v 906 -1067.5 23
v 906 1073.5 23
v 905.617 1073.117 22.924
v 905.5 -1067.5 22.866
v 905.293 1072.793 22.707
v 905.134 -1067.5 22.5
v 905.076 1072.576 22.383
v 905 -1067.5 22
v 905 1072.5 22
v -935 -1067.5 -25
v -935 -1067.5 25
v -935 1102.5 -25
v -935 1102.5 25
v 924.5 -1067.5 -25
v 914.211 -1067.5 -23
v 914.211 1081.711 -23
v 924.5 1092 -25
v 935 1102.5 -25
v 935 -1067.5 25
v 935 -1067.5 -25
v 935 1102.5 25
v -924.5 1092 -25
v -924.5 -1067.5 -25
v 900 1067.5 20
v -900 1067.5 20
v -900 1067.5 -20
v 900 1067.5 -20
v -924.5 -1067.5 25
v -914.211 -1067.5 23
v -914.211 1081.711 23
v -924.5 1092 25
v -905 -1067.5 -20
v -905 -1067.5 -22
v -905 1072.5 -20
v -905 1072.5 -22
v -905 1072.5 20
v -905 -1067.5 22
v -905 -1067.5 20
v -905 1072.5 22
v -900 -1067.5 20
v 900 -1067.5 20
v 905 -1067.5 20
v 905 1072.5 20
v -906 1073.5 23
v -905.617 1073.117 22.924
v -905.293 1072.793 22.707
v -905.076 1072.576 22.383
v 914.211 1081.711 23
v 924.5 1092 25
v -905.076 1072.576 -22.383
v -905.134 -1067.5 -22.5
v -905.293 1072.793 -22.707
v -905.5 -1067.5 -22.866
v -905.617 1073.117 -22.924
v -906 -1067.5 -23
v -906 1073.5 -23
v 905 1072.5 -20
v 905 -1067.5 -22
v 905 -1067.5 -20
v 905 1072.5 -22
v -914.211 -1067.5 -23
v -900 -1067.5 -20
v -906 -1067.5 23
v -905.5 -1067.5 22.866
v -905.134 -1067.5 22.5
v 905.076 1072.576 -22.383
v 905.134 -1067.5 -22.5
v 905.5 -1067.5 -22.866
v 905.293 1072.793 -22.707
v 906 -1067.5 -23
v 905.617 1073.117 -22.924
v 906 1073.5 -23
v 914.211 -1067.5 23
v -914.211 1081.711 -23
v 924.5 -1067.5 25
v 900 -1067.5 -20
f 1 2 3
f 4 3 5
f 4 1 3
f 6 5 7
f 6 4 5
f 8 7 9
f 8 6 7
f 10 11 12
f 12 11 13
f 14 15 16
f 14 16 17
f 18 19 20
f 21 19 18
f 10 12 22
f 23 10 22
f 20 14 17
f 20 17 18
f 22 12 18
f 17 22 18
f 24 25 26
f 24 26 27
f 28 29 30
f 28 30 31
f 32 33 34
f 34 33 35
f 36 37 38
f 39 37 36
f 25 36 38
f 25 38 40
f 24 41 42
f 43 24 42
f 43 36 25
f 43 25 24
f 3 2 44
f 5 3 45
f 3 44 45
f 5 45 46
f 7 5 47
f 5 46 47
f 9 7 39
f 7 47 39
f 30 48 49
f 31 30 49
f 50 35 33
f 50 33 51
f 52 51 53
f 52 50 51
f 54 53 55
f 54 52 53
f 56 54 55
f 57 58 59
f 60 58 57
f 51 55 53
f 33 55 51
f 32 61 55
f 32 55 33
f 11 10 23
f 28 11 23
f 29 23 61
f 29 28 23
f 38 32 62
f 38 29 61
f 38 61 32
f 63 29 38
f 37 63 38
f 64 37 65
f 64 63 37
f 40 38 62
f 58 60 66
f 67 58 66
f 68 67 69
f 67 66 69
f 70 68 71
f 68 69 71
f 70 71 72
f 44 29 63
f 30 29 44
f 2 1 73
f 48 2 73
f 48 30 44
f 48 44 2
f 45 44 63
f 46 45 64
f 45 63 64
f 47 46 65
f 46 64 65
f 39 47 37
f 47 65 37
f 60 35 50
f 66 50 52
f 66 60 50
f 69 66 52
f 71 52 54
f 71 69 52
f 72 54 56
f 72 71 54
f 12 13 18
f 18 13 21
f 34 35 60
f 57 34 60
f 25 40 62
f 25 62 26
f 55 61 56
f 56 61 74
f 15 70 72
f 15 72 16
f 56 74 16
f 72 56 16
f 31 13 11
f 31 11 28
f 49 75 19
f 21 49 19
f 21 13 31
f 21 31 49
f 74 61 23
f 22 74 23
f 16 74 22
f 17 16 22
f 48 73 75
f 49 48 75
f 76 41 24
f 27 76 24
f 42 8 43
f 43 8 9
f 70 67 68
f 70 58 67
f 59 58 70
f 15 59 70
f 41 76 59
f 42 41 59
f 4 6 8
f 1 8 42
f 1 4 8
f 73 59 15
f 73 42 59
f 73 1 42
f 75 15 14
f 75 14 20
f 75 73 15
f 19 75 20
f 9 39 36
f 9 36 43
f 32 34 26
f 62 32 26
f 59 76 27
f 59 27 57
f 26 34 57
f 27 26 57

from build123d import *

# Parameters (mm, degrees)
SKETCH1_W           = 1870
SKETCH1_H           = 2205
SKETCH1_W_2         = 1800
SKETCH1_H_2         = 2135
BOSS_EXTRUDE1_DEPTH = 25
SKETCH2_W           = 1810
SKETCH2_H           = 2145
CUT_EXTRUDE2_DEPTH  = 5
SKETCH3_W           = 1825
SKETCH3_H           = 2160
CUT_EXTRUDE4_DEPTH  = 2
FILLET1_R           = 1
CHAMFER1_SIZE       = 2.33256371
CHAMFER1_SIZE_2     = 12
FILLET2_R           = 1
CHAMFER2_SIZE       = 2.33256371
CHAMFER2_SIZE_2     = 12
SKETCH5_W           = 1870
SKETCH5_H           = 50
CUT_EXTRUDE5_DEPTH  = 35


with BuildPart() as part:
    # Sketch1 → Boss-Extrude1 (new, symmetric)
    with BuildSketch(Plane.XY):
        Rectangle(SKETCH1_W, SKETCH1_H)
        Rectangle(SKETCH1_W_2, SKETCH1_H_2, mode=Mode.SUBTRACT)
    extrude(amount=BOSS_EXTRUDE1_DEPTH, both=True)

    # Sketch2 → Cut-Extrude2 (cut)
    with BuildSketch(Plane.XY.offset(25)):
        Rectangle(SKETCH2_W, SKETCH2_H)
    cut_extrude2 = extrude(amount=-CUT_EXTRUDE2_DEPTH, mode=Mode.SUBTRACT)

    # Sketch3 → Cut-Extrude4 (cut)
    with BuildSketch(Plane.XY.offset(25)):
        Rectangle(SKETCH3_W, SKETCH3_H)
    cut_extrude4 = extrude(amount=-CUT_EXTRUDE4_DEPTH, mode=Mode.SUBTRACT)

    # Fillet1
    fillet1_edges = [part.edges().sort_by_distance(p)[0] for p in [
        (0, -1072.5, 23),
        (-905, 0, 23),
        (0, 1072.5, 23),
        (905, 0, 23),
    ]]
    fillet(fillet1_edges, radius=FILLET1_R)

    # Chamfer1
    # the kernel refuses this chamfer: 12, 2.33256371 mm, written as the material it takes off along each edge
    with BuildSketch(Plane(origin=(912.5, 1080, 25), x_dir=(0, -0.1907987049962236, -0.9816291836389973), z_dir=(-1, 0, 0))) as chamfer1_piece_1_section:
        Polygon((CHAMFER1_SIZE * 0.981629183493, -CHAMFER1_SIZE * 0.190798704968), (-CHAMFER1_SIZE_2 * 0.190798704996, -CHAMFER1_SIZE_2 * 0.981629183639), (0, 0), align=None)
    chamfer1_piece_1 = extrude(amount=1825, mode=Mode.PRIVATE)
    chamfer1_piece_1 = split(chamfer1_piece_1, bisect_by=Plane(origin=(0, 1084.39239505, 23), z_dir=(0, 0, 1)), keep=Keep.TOP, mode=Mode.PRIVATE)
    add(chamfer1_piece_1, mode=Mode.SUBTRACT)
    with BuildSketch(Plane(origin=(912.5, -1080, 25), x_dir=(-0.1907987049962236, 0, -0.9816291836389973), z_dir=(0, 1, 0))) as chamfer1_piece_2_section:
        Polygon((CHAMFER1_SIZE * 0.981629183493, -CHAMFER1_SIZE * 0.190798704968), (-CHAMFER1_SIZE_2 * 0.190798704996, -CHAMFER1_SIZE_2 * 0.981629183639), (0, 0), align=None)
    chamfer1_piece_2 = extrude(amount=2160, mode=Mode.PRIVATE)
    chamfer1_piece_2 = split(chamfer1_piece_2, bisect_by=Plane(origin=(916.89239505, 0, 23), z_dir=(0, 0, 1)), keep=Keep.TOP, mode=Mode.PRIVATE)
    add(chamfer1_piece_2, mode=Mode.SUBTRACT)
    with BuildSketch(Plane(origin=(-912.5, -1080, 25), x_dir=(0, 0.1907987049962236, -0.9816291836389973), z_dir=(1, 0, 0))) as chamfer1_piece_3_section:
        Polygon((CHAMFER1_SIZE * 0.981629183493, -CHAMFER1_SIZE * 0.190798704968), (-CHAMFER1_SIZE_2 * 0.190798704996, -CHAMFER1_SIZE_2 * 0.981629183639), (0, 0), align=None)
    chamfer1_piece_3 = extrude(amount=1825, mode=Mode.PRIVATE)
    chamfer1_piece_3 = split(chamfer1_piece_3, bisect_by=Plane(origin=(0, -1084.39239505, 23), z_dir=(0, 0, 1)), keep=Keep.TOP, mode=Mode.PRIVATE)
    add(chamfer1_piece_3, mode=Mode.SUBTRACT)
    with BuildSketch(Plane(origin=(-912.5, 1080, 25), x_dir=(0.1907987049962236, 0, -0.9816291836389973), z_dir=(0, -1, 0))) as chamfer1_piece_4_section:
        Polygon((CHAMFER1_SIZE * 0.981629183493, -CHAMFER1_SIZE * 0.190798704968), (-CHAMFER1_SIZE_2 * 0.190798704996, -CHAMFER1_SIZE_2 * 0.981629183639), (0, 0), align=None)
    chamfer1_piece_4 = extrude(amount=2160, mode=Mode.PRIVATE)
    chamfer1_piece_4 = split(chamfer1_piece_4, bisect_by=Plane(origin=(-916.89239505, 0, 23), z_dir=(0, 0, 1)), keep=Keep.TOP, mode=Mode.PRIVATE)
    add(chamfer1_piece_4, mode=Mode.SUBTRACT)
    with BuildSketch(Plane(origin=(912.5, -1080, 25), x_dir=(-0.1907987049962236, 0, -0.9816291836389973), z_dir=(0, 1, 0))) as chamfer1_piece_5a_section:
        Polygon((CHAMFER1_SIZE * 0.981629183493, -CHAMFER1_SIZE * 0.190798704968), (-CHAMFER1_SIZE_2 * 0.190798704996, -CHAMFER1_SIZE_2 * 0.981629183639), (0, 0), align=None)
    chamfer1_piece_5a = extrude(amount=2191.178793389, mode=Mode.PRIVATE)
    chamfer1_piece_5a = split(chamfer1_piece_5a, bisect_by=Plane(origin=(916.89239505, 1095.589396695, 23), z_dir=(0, 0, 1)), keep=Keep.TOP, mode=Mode.PRIVATE)
    chamfer1_piece_5a = split(chamfer1_piece_5a, bisect_by=Plane(origin=(916.89239505, 1080, 24.399204817), z_dir=(0, 1, 0)), keep=Keep.TOP, mode=Mode.PRIVATE)
    with BuildSketch(Plane(origin=(943.678793389, 1080, 25), x_dir=(0, -0.1907987049962236, -0.9816291836389973), z_dir=(-1, 0, 0))) as chamfer1_piece_5b_section:
        Polygon((CHAMFER1_SIZE * 0.981629183493, -CHAMFER1_SIZE * 0.190798704968), (-CHAMFER1_SIZE_2 * 0.190798704996, -CHAMFER1_SIZE_2 * 0.981629183639), (0, 0), align=None)
    chamfer1_piece_5b = extrude(amount=1856.178793389, mode=Mode.PRIVATE)
    chamfer1_piece_5b = split(chamfer1_piece_5b, bisect_by=Plane(origin=(928.089396695, 1084.39239505, 23), z_dir=(0, 0, 1)), keep=Keep.TOP, mode=Mode.PRIVATE)
    chamfer1_piece_5b = split(chamfer1_piece_5b, bisect_by=Plane(origin=(912.5, 1084.39239505, 24.399204817), z_dir=(1, 0, 0)), keep=Keep.TOP, mode=Mode.PRIVATE)
    chamfer1_piece_5 = chamfer1_piece_5a & chamfer1_piece_5b
    add(chamfer1_piece_5, mode=Mode.SUBTRACT)
    with BuildSketch(Plane(origin=(912.5, 1080, 25), x_dir=(0, -0.1907987049962236, -0.9816291836389973), z_dir=(-1, 0, 0))) as chamfer1_piece_6a_section:
        Polygon((CHAMFER1_SIZE * 0.981629183493, -CHAMFER1_SIZE * 0.190798704968), (-CHAMFER1_SIZE_2 * 0.190798704996, -CHAMFER1_SIZE_2 * 0.981629183639), (0, 0), align=None)
    chamfer1_piece_6a = extrude(amount=1856.178793389, mode=Mode.PRIVATE)
    chamfer1_piece_6a = split(chamfer1_piece_6a, bisect_by=Plane(origin=(-928.089396695, 1084.39239505, 23), z_dir=(0, 0, 1)), keep=Keep.TOP, mode=Mode.PRIVATE)
    chamfer1_piece_6a = split(chamfer1_piece_6a, bisect_by=Plane(origin=(-912.5, 1084.39239505, 24.399204817), z_dir=(-1, 0, 0)), keep=Keep.TOP, mode=Mode.PRIVATE)
    with BuildSketch(Plane(origin=(-912.5, 1111.178793389, 25), x_dir=(0.1907987049962236, 0, -0.9816291836389973), z_dir=(0, -1, 0))) as chamfer1_piece_6b_section:
        Polygon((CHAMFER1_SIZE * 0.981629183493, -CHAMFER1_SIZE * 0.190798704968), (-CHAMFER1_SIZE_2 * 0.190798704996, -CHAMFER1_SIZE_2 * 0.981629183639), (0, 0), align=None)
    chamfer1_piece_6b = extrude(amount=2191.178793389, mode=Mode.PRIVATE)
    chamfer1_piece_6b = split(chamfer1_piece_6b, bisect_by=Plane(origin=(-916.89239505, 1095.589396695, 23), z_dir=(0, 0, 1)), keep=Keep.TOP, mode=Mode.PRIVATE)
    chamfer1_piece_6b = split(chamfer1_piece_6b, bisect_by=Plane(origin=(-916.89239505, 1080, 24.399204817), z_dir=(0, 1, 0)), keep=Keep.TOP, mode=Mode.PRIVATE)
    chamfer1_piece_6 = chamfer1_piece_6a & chamfer1_piece_6b
    add(chamfer1_piece_6, mode=Mode.SUBTRACT)
    with BuildSketch(Plane(origin=(912.5, -1111.178793389, 25), x_dir=(-0.1907987049962236, 0, -0.9816291836389973), z_dir=(0, 1, 0))) as chamfer1_piece_7a_section:
        Polygon((CHAMFER1_SIZE * 0.981629183493, -CHAMFER1_SIZE * 0.190798704968), (-CHAMFER1_SIZE_2 * 0.190798704996, -CHAMFER1_SIZE_2 * 0.981629183639), (0, 0), align=None)
    chamfer1_piece_7a = extrude(amount=2191.178793389, mode=Mode.PRIVATE)
    chamfer1_piece_7a = split(chamfer1_piece_7a, bisect_by=Plane(origin=(916.89239505, -1095.589396695, 23), z_dir=(0, 0, 1)), keep=Keep.TOP, mode=Mode.PRIVATE)
    chamfer1_piece_7a = split(chamfer1_piece_7a, bisect_by=Plane(origin=(916.89239505, -1080, 24.399204817), z_dir=(0, -1, 0)), keep=Keep.TOP, mode=Mode.PRIVATE)
    with BuildSketch(Plane(origin=(-912.5, -1080, 25), x_dir=(0, 0.1907987049962236, -0.9816291836389973), z_dir=(1, 0, 0))) as chamfer1_piece_7b_section:
        Polygon((CHAMFER1_SIZE * 0.981629183493, -CHAMFER1_SIZE * 0.190798704968), (-CHAMFER1_SIZE_2 * 0.190798704996, -CHAMFER1_SIZE_2 * 0.981629183639), (0, 0), align=None)
    chamfer1_piece_7b = extrude(amount=1856.178793389, mode=Mode.PRIVATE)
    chamfer1_piece_7b = split(chamfer1_piece_7b, bisect_by=Plane(origin=(928.089396695, -1084.39239505, 23), z_dir=(0, 0, 1)), keep=Keep.TOP, mode=Mode.PRIVATE)
    chamfer1_piece_7b = split(chamfer1_piece_7b, bisect_by=Plane(origin=(912.5, -1084.39239505, 24.399204817), z_dir=(1, 0, 0)), keep=Keep.TOP, mode=Mode.PRIVATE)
    chamfer1_piece_7 = chamfer1_piece_7a & chamfer1_piece_7b
    add(chamfer1_piece_7, mode=Mode.SUBTRACT)
    with BuildSketch(Plane(origin=(-943.678793389, -1080, 25), x_dir=(0, 0.1907987049962236, -0.9816291836389973), z_dir=(1, 0, 0))) as chamfer1_piece_8a_section:
        Polygon((CHAMFER1_SIZE * 0.981629183493, -CHAMFER1_SIZE * 0.190798704968), (-CHAMFER1_SIZE_2 * 0.190798704996, -CHAMFER1_SIZE_2 * 0.981629183639), (0, 0), align=None)
    chamfer1_piece_8a = extrude(amount=1856.178793389, mode=Mode.PRIVATE)
    chamfer1_piece_8a = split(chamfer1_piece_8a, bisect_by=Plane(origin=(-928.089396695, -1084.39239505, 23), z_dir=(0, 0, 1)), keep=Keep.TOP, mode=Mode.PRIVATE)
    chamfer1_piece_8a = split(chamfer1_piece_8a, bisect_by=Plane(origin=(-912.5, -1084.39239505, 24.399204817), z_dir=(-1, 0, 0)), keep=Keep.TOP, mode=Mode.PRIVATE)
    with BuildSketch(Plane(origin=(-912.5, 1080, 25), x_dir=(0.1907987049962236, 0, -0.9816291836389973), z_dir=(0, -1, 0))) as chamfer1_piece_8b_section:
        Polygon((CHAMFER1_SIZE * 0.981629183493, -CHAMFER1_SIZE * 0.190798704968), (-CHAMFER1_SIZE_2 * 0.190798704996, -CHAMFER1_SIZE_2 * 0.981629183639), (0, 0), align=None)
    chamfer1_piece_8b = extrude(amount=2191.178793389, mode=Mode.PRIVATE)
    chamfer1_piece_8b = split(chamfer1_piece_8b, bisect_by=Plane(origin=(-916.89239505, -1095.589396695, 23), z_dir=(0, 0, 1)), keep=Keep.TOP, mode=Mode.PRIVATE)
    chamfer1_piece_8b = split(chamfer1_piece_8b, bisect_by=Plane(origin=(-916.89239505, -1080, 24.399204817), z_dir=(0, -1, 0)), keep=Keep.TOP, mode=Mode.PRIVATE)
    chamfer1_piece_8 = chamfer1_piece_8a & chamfer1_piece_8b
    add(chamfer1_piece_8, mode=Mode.SUBTRACT)

    # Mirror1: Cut-Extrude2, Cut-Extrude4 across plane
    add(cut_extrude2.mirror(Plane.XY), mode=Mode.SUBTRACT)
    add(cut_extrude4.mirror(Plane.XY), mode=Mode.SUBTRACT)

    # Fillet2
    fillet2_edges = [part.edges().sort_by_distance(p)[0] for p in [
        (0, 1072.5, -23),
        (0, -1072.5, -23),
        (-905, 0, -23),
        (905, 0, -23),
    ]]
    fillet(fillet2_edges, radius=FILLET2_R)

    # Chamfer2
    # the kernel refuses this chamfer: 12, 2.33256371 mm, written as the material it takes off along each edge
    with BuildSketch(Plane(origin=(912.5, 1080, -25), x_dir=(0, -0.1907987049962236, 0.9816291836389973), z_dir=(-1, 0, 0))) as chamfer2_piece_1_section:
        Polygon((CHAMFER2_SIZE * 0.981629183493, CHAMFER2_SIZE * 0.190798704968), (-CHAMFER2_SIZE_2 * 0.190798704996, CHAMFER2_SIZE_2 * 0.981629183639), (0, 0), align=None)
    chamfer2_piece_1 = extrude(amount=1825, mode=Mode.PRIVATE)
    chamfer2_piece_1 = split(chamfer2_piece_1, bisect_by=Plane(origin=(0, 1084.39239505, -23), z_dir=(0, 0, -1)), keep=Keep.TOP, mode=Mode.PRIVATE)
    add(chamfer2_piece_1, mode=Mode.SUBTRACT)
    with BuildSketch(Plane(origin=(912.5, -1080, -25), x_dir=(-0.1907987049962236, 0, 0.9816291836389973), z_dir=(0, 1, 0))) as chamfer2_piece_2_section:
        Polygon((CHAMFER2_SIZE * 0.981629183493, CHAMFER2_SIZE * 0.190798704968), (-CHAMFER2_SIZE_2 * 0.190798704996, CHAMFER2_SIZE_2 * 0.981629183639), (0, 0), align=None)
    chamfer2_piece_2 = extrude(amount=2160, mode=Mode.PRIVATE)
    chamfer2_piece_2 = split(chamfer2_piece_2, bisect_by=Plane(origin=(916.89239505, 0, -23), z_dir=(0, 0, -1)), keep=Keep.TOP, mode=Mode.PRIVATE)
    add(chamfer2_piece_2, mode=Mode.SUBTRACT)
    with BuildSketch(Plane(origin=(-912.5, 1080, -25), x_dir=(0.1907987049962236, 0, 0.9816291836389973), z_dir=(0, -1, 0))) as chamfer2_piece_3_section:
        Polygon((CHAMFER2_SIZE * 0.981629183493, CHAMFER2_SIZE * 0.190798704968), (-CHAMFER2_SIZE_2 * 0.190798704996, CHAMFER2_SIZE_2 * 0.981629183639), (0, 0), align=None)
    chamfer2_piece_3 = extrude(amount=2160, mode=Mode.PRIVATE)
    chamfer2_piece_3 = split(chamfer2_piece_3, bisect_by=Plane(origin=(-916.89239505, 0, -23), z_dir=(0, 0, -1)), keep=Keep.TOP, mode=Mode.PRIVATE)
    add(chamfer2_piece_3, mode=Mode.SUBTRACT)
    with BuildSketch(Plane(origin=(-912.5, -1080, -25), x_dir=(0, 0.1907987049962236, 0.9816291836389973), z_dir=(1, 0, 0))) as chamfer2_piece_4_section:
        Polygon((CHAMFER2_SIZE * 0.981629183493, CHAMFER2_SIZE * 0.190798704968), (-CHAMFER2_SIZE_2 * 0.190798704996, CHAMFER2_SIZE_2 * 0.981629183639), (0, 0), align=None)
    chamfer2_piece_4 = extrude(amount=1825, mode=Mode.PRIVATE)
    chamfer2_piece_4 = split(chamfer2_piece_4, bisect_by=Plane(origin=(0, -1084.39239505, -23), z_dir=(0, 0, -1)), keep=Keep.TOP, mode=Mode.PRIVATE)
    add(chamfer2_piece_4, mode=Mode.SUBTRACT)
    with BuildSketch(Plane(origin=(912.5, -1080, -25), x_dir=(-0.1907987049962236, 0, 0.9816291836389973), z_dir=(0, 1, 0))) as chamfer2_piece_5a_section:
        Polygon((CHAMFER2_SIZE * 0.981629183493, CHAMFER2_SIZE * 0.190798704968), (-CHAMFER2_SIZE_2 * 0.190798704996, CHAMFER2_SIZE_2 * 0.981629183639), (0, 0), align=None)
    chamfer2_piece_5a = extrude(amount=2191.178793389, mode=Mode.PRIVATE)
    chamfer2_piece_5a = split(chamfer2_piece_5a, bisect_by=Plane(origin=(916.89239505, 1095.589396695, -23), z_dir=(0, 0, -1)), keep=Keep.TOP, mode=Mode.PRIVATE)
    chamfer2_piece_5a = split(chamfer2_piece_5a, bisect_by=Plane(origin=(916.89239505, 1080, -24.399204817), z_dir=(0, 1, 0)), keep=Keep.TOP, mode=Mode.PRIVATE)
    with BuildSketch(Plane(origin=(943.678793389, 1080, -25), x_dir=(0, -0.1907987049962236, 0.9816291836389973), z_dir=(-1, 0, 0))) as chamfer2_piece_5b_section:
        Polygon((CHAMFER2_SIZE * 0.981629183493, CHAMFER2_SIZE * 0.190798704968), (-CHAMFER2_SIZE_2 * 0.190798704996, CHAMFER2_SIZE_2 * 0.981629183639), (0, 0), align=None)
    chamfer2_piece_5b = extrude(amount=1856.178793389, mode=Mode.PRIVATE)
    chamfer2_piece_5b = split(chamfer2_piece_5b, bisect_by=Plane(origin=(928.089396695, 1084.39239505, -23), z_dir=(0, 0, -1)), keep=Keep.TOP, mode=Mode.PRIVATE)
    chamfer2_piece_5b = split(chamfer2_piece_5b, bisect_by=Plane(origin=(912.5, 1084.39239505, -24.399204817), z_dir=(1, 0, 0)), keep=Keep.TOP, mode=Mode.PRIVATE)
    chamfer2_piece_5 = chamfer2_piece_5a & chamfer2_piece_5b
    add(chamfer2_piece_5, mode=Mode.SUBTRACT)
    with BuildSketch(Plane(origin=(912.5, 1080, -25), x_dir=(0, -0.1907987049962236, 0.9816291836389973), z_dir=(-1, 0, 0))) as chamfer2_piece_6a_section:
        Polygon((CHAMFER2_SIZE * 0.981629183493, CHAMFER2_SIZE * 0.190798704968), (-CHAMFER2_SIZE_2 * 0.190798704996, CHAMFER2_SIZE_2 * 0.981629183639), (0, 0), align=None)
    chamfer2_piece_6a = extrude(amount=1856.178793389, mode=Mode.PRIVATE)
    chamfer2_piece_6a = split(chamfer2_piece_6a, bisect_by=Plane(origin=(-928.089396695, 1084.39239505, -23), z_dir=(0, 0, -1)), keep=Keep.TOP, mode=Mode.PRIVATE)
    chamfer2_piece_6a = split(chamfer2_piece_6a, bisect_by=Plane(origin=(-912.5, 1084.39239505, -24.399204817), z_dir=(-1, 0, 0)), keep=Keep.TOP, mode=Mode.PRIVATE)
    with BuildSketch(Plane(origin=(-912.5, 1111.178793389, -25), x_dir=(0.1907987049962236, 0, 0.9816291836389973), z_dir=(0, -1, 0))) as chamfer2_piece_6b_section:
        Polygon((CHAMFER2_SIZE * 0.981629183493, CHAMFER2_SIZE * 0.190798704968), (-CHAMFER2_SIZE_2 * 0.190798704996, CHAMFER2_SIZE_2 * 0.981629183639), (0, 0), align=None)
    chamfer2_piece_6b = extrude(amount=2191.178793389, mode=Mode.PRIVATE)
    chamfer2_piece_6b = split(chamfer2_piece_6b, bisect_by=Plane(origin=(-916.89239505, 1095.589396695, -23), z_dir=(0, 0, -1)), keep=Keep.TOP, mode=Mode.PRIVATE)
    chamfer2_piece_6b = split(chamfer2_piece_6b, bisect_by=Plane(origin=(-916.89239505, 1080, -24.399204817), z_dir=(0, 1, 0)), keep=Keep.TOP, mode=Mode.PRIVATE)
    chamfer2_piece_6 = chamfer2_piece_6a & chamfer2_piece_6b
    add(chamfer2_piece_6, mode=Mode.SUBTRACT)
    with BuildSketch(Plane(origin=(912.5, -1111.178793389, -25), x_dir=(-0.1907987049962236, 0, 0.9816291836389973), z_dir=(0, 1, 0))) as chamfer2_piece_7a_section:
        Polygon((CHAMFER2_SIZE * 0.981629183493, CHAMFER2_SIZE * 0.190798704968), (-CHAMFER2_SIZE_2 * 0.190798704996, CHAMFER2_SIZE_2 * 0.981629183639), (0, 0), align=None)
    chamfer2_piece_7a = extrude(amount=2191.178793389, mode=Mode.PRIVATE)
    chamfer2_piece_7a = split(chamfer2_piece_7a, bisect_by=Plane(origin=(916.89239505, -1095.589396695, -23), z_dir=(0, 0, -1)), keep=Keep.TOP, mode=Mode.PRIVATE)
    chamfer2_piece_7a = split(chamfer2_piece_7a, bisect_by=Plane(origin=(916.89239505, -1080, -24.399204817), z_dir=(0, -1, 0)), keep=Keep.TOP, mode=Mode.PRIVATE)
    with BuildSketch(Plane(origin=(-912.5, -1080, -25), x_dir=(0, 0.1907987049962236, 0.9816291836389973), z_dir=(1, 0, 0))) as chamfer2_piece_7b_section:
        Polygon((CHAMFER2_SIZE * 0.981629183493, CHAMFER2_SIZE * 0.190798704968), (-CHAMFER2_SIZE_2 * 0.190798704996, CHAMFER2_SIZE_2 * 0.981629183639), (0, 0), align=None)
    chamfer2_piece_7b = extrude(amount=1856.178793389, mode=Mode.PRIVATE)
    chamfer2_piece_7b = split(chamfer2_piece_7b, bisect_by=Plane(origin=(928.089396695, -1084.39239505, -23), z_dir=(0, 0, -1)), keep=Keep.TOP, mode=Mode.PRIVATE)
    chamfer2_piece_7b = split(chamfer2_piece_7b, bisect_by=Plane(origin=(912.5, -1084.39239505, -24.399204817), z_dir=(1, 0, 0)), keep=Keep.TOP, mode=Mode.PRIVATE)
    chamfer2_piece_7 = chamfer2_piece_7a & chamfer2_piece_7b
    add(chamfer2_piece_7, mode=Mode.SUBTRACT)
    with BuildSketch(Plane(origin=(-943.678793389, -1080, -25), x_dir=(0, 0.1907987049962236, 0.9816291836389973), z_dir=(1, 0, 0))) as chamfer2_piece_8a_section:
        Polygon((CHAMFER2_SIZE * 0.981629183493, CHAMFER2_SIZE * 0.190798704968), (-CHAMFER2_SIZE_2 * 0.190798704996, CHAMFER2_SIZE_2 * 0.981629183639), (0, 0), align=None)
    chamfer2_piece_8a = extrude(amount=1856.178793389, mode=Mode.PRIVATE)
    chamfer2_piece_8a = split(chamfer2_piece_8a, bisect_by=Plane(origin=(-928.089396695, -1084.39239505, -23), z_dir=(0, 0, -1)), keep=Keep.TOP, mode=Mode.PRIVATE)
    chamfer2_piece_8a = split(chamfer2_piece_8a, bisect_by=Plane(origin=(-912.5, -1084.39239505, -24.399204817), z_dir=(-1, 0, 0)), keep=Keep.TOP, mode=Mode.PRIVATE)
    with BuildSketch(Plane(origin=(-912.5, 1080, -25), x_dir=(0.1907987049962236, 0, 0.9816291836389973), z_dir=(0, -1, 0))) as chamfer2_piece_8b_section:
        Polygon((CHAMFER2_SIZE * 0.981629183493, CHAMFER2_SIZE * 0.190798704968), (-CHAMFER2_SIZE_2 * 0.190798704996, CHAMFER2_SIZE_2 * 0.981629183639), (0, 0), align=None)
    chamfer2_piece_8b = extrude(amount=2191.178793389, mode=Mode.PRIVATE)
    chamfer2_piece_8b = split(chamfer2_piece_8b, bisect_by=Plane(origin=(-916.89239505, -1095.589396695, -23), z_dir=(0, 0, -1)), keep=Keep.TOP, mode=Mode.PRIVATE)
    chamfer2_piece_8b = split(chamfer2_piece_8b, bisect_by=Plane(origin=(-916.89239505, -1080, -24.399204817), z_dir=(0, -1, 0)), keep=Keep.TOP, mode=Mode.PRIVATE)
    chamfer2_piece_8 = chamfer2_piece_8a & chamfer2_piece_8b
    add(chamfer2_piece_8, mode=Mode.SUBTRACT)

    # Sketch5 → Cut-Extrude5 (cut)
    with BuildSketch(Plane.XZ.offset(1102.5)):
        Rectangle(SKETCH5_W, SKETCH5_H)
    extrude(amount=-CUT_EXTRUDE5_DEPTH, mode=Mode.SUBTRACT)


solid = part.part
